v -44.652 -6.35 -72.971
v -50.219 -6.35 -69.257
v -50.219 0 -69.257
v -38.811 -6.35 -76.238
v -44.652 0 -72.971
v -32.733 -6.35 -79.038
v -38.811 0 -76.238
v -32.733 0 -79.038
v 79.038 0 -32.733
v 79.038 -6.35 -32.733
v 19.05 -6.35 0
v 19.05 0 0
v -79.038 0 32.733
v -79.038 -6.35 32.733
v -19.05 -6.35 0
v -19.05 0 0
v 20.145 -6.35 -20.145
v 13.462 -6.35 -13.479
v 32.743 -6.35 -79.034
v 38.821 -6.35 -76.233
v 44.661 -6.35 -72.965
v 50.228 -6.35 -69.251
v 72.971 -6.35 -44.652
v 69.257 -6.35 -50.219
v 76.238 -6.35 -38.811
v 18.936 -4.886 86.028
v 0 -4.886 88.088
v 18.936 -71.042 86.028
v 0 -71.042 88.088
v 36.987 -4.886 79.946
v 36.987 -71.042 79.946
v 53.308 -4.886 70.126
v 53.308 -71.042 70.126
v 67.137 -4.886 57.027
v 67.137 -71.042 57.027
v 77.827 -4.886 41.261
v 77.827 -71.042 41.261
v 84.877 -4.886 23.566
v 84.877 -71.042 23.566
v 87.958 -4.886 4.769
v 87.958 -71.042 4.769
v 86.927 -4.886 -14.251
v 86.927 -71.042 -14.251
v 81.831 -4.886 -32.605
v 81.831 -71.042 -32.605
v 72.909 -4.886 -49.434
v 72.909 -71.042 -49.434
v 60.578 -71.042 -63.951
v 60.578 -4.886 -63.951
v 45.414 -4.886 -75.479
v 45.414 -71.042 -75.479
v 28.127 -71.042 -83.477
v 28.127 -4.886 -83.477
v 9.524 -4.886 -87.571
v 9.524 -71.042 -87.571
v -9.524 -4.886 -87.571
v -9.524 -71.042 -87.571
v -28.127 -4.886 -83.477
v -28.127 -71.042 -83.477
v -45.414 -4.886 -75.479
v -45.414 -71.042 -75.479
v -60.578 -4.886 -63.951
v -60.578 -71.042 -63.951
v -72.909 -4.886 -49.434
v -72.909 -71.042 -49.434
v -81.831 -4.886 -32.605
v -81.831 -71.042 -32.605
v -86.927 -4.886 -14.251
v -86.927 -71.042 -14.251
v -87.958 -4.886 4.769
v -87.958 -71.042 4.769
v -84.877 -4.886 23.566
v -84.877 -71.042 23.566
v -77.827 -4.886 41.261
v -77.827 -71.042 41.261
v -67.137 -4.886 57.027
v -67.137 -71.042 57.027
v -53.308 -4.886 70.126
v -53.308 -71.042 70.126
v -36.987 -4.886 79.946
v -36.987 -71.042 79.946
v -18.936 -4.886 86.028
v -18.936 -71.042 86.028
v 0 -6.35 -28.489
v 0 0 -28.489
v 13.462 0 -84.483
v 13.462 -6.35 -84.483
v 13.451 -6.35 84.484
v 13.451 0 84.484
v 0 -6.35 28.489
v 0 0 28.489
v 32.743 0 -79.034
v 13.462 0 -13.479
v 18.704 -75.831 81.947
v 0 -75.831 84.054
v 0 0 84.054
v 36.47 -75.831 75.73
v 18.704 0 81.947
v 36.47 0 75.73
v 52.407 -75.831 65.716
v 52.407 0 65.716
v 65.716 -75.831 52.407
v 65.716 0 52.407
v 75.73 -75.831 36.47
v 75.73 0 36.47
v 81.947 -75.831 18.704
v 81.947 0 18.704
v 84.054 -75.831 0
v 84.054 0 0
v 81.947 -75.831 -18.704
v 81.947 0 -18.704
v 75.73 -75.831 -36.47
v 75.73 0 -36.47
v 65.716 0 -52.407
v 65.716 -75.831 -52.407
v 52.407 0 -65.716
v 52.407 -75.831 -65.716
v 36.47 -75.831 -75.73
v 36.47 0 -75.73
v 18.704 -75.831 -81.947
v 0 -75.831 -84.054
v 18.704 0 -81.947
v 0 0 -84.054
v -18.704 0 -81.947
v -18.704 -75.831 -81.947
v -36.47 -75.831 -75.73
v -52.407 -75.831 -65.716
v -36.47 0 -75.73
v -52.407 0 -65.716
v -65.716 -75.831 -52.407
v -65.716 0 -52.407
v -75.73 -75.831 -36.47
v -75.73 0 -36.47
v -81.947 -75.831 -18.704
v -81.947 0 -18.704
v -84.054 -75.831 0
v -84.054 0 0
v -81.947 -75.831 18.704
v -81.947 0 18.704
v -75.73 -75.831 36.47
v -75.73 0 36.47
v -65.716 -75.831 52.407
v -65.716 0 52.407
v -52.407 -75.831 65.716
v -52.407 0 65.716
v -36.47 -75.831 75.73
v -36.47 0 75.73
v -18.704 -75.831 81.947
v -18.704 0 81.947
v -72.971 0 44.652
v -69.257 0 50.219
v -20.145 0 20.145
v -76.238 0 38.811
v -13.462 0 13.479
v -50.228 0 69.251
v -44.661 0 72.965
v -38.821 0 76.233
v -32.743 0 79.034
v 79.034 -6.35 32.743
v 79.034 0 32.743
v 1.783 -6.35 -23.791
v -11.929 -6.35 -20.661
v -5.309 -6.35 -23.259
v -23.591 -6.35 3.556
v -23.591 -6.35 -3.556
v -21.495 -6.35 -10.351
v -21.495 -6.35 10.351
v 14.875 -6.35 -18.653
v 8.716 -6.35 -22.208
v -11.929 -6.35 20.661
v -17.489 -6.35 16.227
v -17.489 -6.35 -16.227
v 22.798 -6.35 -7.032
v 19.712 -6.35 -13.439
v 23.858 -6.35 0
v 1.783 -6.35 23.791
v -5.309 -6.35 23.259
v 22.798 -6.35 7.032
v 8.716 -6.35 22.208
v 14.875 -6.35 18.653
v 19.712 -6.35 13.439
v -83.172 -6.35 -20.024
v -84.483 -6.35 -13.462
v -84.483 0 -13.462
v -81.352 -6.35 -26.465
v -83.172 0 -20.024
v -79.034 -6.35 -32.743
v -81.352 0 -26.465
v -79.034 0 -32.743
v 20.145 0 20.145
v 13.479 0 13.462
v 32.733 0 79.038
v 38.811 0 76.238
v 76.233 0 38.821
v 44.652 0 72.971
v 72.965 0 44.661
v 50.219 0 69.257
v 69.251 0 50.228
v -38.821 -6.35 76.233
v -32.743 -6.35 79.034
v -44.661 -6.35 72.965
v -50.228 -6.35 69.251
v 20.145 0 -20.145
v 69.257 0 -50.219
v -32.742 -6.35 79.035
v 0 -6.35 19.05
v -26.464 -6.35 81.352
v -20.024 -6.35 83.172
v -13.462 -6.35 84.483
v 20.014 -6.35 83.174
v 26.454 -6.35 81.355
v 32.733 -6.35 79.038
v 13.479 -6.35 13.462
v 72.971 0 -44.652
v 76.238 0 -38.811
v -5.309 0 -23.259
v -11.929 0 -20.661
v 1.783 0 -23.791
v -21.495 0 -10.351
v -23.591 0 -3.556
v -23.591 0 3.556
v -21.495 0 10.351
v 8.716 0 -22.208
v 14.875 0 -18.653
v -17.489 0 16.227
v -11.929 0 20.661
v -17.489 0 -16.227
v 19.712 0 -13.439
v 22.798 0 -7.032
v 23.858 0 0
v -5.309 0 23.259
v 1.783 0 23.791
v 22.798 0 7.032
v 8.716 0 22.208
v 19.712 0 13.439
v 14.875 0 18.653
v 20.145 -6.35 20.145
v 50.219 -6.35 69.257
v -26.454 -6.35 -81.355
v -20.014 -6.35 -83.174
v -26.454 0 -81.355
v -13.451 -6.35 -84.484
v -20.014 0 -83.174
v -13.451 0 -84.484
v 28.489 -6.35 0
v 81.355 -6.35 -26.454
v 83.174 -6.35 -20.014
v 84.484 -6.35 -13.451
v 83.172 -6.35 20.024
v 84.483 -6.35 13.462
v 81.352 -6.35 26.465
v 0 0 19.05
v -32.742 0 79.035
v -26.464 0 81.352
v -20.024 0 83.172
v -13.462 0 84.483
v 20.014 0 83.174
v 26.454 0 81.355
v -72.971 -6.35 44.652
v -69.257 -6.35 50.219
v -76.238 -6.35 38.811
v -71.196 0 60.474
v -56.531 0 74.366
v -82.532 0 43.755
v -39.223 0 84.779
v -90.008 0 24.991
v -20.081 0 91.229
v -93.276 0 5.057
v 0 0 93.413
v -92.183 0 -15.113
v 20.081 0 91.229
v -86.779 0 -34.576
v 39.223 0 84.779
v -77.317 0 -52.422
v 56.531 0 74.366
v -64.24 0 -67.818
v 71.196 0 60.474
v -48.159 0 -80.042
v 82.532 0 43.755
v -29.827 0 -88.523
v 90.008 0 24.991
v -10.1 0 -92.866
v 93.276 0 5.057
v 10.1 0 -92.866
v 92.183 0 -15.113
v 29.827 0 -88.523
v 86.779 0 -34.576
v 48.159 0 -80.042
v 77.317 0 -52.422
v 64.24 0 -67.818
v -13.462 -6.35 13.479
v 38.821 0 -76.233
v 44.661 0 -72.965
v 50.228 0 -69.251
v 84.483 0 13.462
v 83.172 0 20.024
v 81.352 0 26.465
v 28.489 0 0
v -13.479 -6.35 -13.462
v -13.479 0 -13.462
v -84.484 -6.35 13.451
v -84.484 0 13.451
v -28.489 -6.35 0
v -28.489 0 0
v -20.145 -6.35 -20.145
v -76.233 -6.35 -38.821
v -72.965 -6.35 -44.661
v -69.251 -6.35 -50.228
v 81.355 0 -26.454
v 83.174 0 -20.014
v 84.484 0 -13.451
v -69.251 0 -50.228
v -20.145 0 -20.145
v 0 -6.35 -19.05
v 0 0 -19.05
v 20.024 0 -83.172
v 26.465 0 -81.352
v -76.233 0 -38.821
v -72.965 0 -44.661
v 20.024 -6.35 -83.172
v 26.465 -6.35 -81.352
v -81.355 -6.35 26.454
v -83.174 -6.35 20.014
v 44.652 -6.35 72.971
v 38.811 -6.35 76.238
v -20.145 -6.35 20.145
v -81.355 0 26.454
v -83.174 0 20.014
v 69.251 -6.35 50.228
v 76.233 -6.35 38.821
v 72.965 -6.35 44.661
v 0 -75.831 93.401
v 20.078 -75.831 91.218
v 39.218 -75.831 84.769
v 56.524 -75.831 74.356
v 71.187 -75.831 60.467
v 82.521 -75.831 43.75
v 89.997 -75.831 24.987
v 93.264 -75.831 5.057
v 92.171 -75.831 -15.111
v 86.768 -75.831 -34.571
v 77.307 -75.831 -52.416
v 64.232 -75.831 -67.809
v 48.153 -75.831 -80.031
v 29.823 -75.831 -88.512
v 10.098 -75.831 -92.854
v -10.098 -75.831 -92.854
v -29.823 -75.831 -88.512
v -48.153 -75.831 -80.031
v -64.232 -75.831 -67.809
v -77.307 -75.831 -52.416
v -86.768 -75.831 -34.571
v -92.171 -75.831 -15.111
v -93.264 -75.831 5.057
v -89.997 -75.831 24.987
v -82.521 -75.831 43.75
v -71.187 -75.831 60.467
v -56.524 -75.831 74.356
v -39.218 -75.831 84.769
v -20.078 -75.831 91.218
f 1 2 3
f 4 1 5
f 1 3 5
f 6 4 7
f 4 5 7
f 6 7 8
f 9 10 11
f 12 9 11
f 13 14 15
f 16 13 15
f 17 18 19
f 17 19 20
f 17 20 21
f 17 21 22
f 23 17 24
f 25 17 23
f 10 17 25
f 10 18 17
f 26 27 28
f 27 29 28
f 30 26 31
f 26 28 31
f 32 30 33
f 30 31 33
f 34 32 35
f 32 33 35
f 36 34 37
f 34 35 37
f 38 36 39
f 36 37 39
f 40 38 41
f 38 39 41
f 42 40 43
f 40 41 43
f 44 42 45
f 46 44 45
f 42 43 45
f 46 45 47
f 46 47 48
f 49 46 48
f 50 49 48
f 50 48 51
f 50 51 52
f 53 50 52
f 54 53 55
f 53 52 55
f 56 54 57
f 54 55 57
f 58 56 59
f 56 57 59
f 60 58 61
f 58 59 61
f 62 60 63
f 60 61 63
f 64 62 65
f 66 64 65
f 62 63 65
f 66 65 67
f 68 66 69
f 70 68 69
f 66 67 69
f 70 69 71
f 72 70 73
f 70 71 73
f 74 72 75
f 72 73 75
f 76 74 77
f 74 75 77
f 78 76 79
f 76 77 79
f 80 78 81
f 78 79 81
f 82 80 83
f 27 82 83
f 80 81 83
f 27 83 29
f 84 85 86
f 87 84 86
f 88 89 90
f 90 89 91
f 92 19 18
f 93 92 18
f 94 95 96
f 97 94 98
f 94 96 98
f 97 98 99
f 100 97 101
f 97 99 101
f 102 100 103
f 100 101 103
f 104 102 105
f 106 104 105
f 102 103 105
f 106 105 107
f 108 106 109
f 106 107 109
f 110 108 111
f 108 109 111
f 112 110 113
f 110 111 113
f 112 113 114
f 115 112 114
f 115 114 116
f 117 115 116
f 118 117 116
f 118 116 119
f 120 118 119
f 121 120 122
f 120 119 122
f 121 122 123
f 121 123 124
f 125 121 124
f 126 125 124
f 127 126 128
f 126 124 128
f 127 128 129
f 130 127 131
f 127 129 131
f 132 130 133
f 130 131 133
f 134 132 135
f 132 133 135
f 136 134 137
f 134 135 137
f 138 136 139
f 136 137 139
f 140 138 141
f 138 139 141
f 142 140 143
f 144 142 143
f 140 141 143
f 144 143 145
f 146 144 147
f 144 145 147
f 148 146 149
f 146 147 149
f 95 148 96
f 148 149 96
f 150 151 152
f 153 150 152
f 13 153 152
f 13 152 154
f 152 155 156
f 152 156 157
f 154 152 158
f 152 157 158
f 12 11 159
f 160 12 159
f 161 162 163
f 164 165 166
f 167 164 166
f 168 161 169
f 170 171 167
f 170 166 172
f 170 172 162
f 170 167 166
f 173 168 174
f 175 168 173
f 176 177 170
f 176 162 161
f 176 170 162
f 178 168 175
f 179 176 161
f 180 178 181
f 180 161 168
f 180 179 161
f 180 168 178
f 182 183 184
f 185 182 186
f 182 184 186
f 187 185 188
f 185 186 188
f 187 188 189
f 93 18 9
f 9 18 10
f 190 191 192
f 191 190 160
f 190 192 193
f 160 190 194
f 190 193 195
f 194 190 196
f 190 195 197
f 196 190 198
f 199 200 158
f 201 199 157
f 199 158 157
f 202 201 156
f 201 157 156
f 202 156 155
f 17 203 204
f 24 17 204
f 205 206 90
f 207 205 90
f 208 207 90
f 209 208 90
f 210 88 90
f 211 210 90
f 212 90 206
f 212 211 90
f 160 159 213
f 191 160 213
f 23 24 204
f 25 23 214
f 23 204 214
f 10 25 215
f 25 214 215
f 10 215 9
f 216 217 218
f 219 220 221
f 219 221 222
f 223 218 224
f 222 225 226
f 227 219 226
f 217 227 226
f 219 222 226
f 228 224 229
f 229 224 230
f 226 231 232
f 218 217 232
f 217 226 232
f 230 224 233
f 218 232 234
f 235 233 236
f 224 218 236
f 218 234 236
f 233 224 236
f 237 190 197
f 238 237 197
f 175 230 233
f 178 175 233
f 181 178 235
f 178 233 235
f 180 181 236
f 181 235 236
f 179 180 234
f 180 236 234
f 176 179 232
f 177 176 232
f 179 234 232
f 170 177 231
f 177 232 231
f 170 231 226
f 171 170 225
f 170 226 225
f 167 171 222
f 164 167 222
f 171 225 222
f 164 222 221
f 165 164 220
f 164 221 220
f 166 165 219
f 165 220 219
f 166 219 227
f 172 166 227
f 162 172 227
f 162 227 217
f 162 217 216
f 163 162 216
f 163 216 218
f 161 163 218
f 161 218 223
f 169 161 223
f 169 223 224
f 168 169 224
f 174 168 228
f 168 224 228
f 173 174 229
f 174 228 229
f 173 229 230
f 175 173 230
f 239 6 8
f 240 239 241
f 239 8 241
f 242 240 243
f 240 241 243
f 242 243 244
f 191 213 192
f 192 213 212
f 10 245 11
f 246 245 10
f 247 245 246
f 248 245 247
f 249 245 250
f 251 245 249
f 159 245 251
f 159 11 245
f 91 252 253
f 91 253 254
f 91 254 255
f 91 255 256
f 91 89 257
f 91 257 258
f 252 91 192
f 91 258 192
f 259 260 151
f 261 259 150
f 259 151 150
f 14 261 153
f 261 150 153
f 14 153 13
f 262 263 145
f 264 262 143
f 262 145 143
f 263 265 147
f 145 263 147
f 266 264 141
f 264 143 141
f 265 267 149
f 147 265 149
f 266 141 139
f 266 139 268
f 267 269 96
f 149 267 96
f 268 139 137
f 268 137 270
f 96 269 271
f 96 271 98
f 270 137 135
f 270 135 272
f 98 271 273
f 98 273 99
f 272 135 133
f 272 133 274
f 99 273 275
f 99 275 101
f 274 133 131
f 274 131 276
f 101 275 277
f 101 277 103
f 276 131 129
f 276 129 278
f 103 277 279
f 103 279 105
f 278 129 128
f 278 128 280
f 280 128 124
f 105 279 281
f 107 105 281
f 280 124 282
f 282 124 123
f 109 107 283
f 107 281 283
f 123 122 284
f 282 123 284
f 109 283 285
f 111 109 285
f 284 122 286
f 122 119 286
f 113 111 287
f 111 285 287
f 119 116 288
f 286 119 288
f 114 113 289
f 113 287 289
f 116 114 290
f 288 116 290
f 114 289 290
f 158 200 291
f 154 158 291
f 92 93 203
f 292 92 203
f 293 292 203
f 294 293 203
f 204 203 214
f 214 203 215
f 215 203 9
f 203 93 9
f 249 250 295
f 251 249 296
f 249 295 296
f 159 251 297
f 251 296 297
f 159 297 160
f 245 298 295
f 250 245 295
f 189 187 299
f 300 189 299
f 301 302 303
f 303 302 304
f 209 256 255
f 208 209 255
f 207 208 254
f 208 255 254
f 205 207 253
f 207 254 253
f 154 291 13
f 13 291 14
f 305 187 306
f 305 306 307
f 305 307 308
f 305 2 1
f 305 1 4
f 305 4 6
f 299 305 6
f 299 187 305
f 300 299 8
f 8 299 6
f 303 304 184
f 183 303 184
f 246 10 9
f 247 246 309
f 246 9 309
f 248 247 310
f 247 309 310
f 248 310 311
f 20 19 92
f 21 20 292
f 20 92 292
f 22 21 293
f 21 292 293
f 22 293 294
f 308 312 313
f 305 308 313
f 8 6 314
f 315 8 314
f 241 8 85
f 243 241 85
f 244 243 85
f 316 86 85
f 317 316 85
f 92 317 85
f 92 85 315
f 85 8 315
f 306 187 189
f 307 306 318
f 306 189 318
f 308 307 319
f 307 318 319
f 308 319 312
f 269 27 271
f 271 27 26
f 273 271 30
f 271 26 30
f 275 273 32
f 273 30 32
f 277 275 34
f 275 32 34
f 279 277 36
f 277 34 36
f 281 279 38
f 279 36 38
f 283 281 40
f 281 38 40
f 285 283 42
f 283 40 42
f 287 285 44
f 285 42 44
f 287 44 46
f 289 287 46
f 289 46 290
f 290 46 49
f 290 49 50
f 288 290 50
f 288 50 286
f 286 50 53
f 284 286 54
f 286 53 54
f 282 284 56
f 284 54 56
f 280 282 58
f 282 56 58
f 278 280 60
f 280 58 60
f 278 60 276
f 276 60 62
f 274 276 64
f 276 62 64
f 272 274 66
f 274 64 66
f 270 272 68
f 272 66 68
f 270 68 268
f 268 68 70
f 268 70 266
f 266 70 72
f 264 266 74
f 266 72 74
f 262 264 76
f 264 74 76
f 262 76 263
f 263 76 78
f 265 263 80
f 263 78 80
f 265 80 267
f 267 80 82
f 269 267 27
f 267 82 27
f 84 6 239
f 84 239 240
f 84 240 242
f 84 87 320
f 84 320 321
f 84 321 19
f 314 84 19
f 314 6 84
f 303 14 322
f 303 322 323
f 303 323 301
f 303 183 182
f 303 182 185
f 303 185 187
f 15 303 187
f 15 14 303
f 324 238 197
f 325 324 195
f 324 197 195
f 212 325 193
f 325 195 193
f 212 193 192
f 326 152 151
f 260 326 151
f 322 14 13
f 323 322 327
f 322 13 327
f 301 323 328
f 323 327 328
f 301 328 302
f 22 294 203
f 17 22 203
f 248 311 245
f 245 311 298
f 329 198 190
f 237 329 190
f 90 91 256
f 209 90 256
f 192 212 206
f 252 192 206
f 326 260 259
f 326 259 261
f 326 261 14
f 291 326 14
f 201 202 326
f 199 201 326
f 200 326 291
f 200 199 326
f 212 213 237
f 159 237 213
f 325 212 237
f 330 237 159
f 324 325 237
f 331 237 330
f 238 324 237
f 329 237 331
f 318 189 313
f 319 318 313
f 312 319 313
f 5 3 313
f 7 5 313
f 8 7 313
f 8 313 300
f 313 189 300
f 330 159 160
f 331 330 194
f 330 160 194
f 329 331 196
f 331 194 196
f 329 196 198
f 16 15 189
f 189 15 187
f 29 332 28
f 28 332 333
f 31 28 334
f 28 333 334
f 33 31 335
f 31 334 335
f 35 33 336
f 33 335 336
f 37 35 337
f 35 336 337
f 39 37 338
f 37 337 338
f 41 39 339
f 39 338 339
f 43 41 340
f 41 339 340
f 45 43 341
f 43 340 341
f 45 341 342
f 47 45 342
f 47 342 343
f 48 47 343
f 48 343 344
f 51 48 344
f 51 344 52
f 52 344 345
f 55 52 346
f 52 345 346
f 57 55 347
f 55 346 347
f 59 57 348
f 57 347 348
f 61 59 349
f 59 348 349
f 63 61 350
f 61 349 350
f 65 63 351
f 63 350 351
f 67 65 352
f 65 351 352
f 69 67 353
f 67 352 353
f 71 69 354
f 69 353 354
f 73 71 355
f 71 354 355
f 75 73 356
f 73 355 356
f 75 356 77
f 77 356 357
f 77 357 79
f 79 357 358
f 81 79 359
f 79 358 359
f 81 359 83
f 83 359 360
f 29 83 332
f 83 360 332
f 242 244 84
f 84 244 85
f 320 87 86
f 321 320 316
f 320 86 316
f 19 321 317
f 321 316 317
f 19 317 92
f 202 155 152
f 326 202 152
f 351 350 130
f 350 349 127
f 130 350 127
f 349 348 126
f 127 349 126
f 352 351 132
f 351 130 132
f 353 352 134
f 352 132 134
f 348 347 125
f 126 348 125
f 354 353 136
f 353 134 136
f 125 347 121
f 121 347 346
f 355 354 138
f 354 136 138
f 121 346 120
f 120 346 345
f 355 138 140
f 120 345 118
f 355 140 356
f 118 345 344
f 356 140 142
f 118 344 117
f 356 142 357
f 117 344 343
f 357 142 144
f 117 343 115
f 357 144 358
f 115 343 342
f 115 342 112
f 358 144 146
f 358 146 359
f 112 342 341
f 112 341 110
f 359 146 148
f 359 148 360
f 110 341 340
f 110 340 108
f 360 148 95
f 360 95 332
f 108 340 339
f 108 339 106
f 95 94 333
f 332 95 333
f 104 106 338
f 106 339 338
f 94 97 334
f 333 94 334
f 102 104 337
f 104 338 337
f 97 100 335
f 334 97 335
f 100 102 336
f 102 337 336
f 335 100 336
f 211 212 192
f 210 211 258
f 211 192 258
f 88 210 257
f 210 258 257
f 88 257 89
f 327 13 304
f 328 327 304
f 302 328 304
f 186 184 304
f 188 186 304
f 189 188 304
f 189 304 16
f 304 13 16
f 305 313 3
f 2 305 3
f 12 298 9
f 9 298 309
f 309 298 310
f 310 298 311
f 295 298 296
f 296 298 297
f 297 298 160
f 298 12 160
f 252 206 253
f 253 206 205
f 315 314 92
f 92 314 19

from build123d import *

# Parameters (mm, degrees)
F0_R     = 19.05
F1_DEPTH = 6.35
F3_DEPTH = 25.4
F4_R     = 23.857637564
F5_DEPTH = 6.35


with BuildPart() as f1:
    # F0 (on Front) → F1 (new body)
    with BuildSketch(Plane.XZ):
        with BuildLine():
            Line((13.4509662166, 84.484256804), (0, 28.4890606999))
            Line((0, 28.4890606999), (-13.4615930724, 84.4825641883))
            ThreePointArc((-13.4615930724, 84.4825641883), (-32.7429024117, 79.0342993993), (-50.2281214643, 69.2506603149))
            Line((-50.2281214643, 69.2506603149), (-20.1448080106, 20.1448080106))
            Line((-20.1448080106, 20.1448080106), (-69.2569777767, 50.2194102825))
            ThreePointArc((-69.2569777767, 50.2194102825), (-79.0384173826, 32.7329607205), (-84.484256804, 13.4509662166))
            Line((-84.484256804, 13.4509662166), (-28.4890606999, 0))
            Line((-28.4890606999, 0), (-84.4825641883, -13.4615930724))
            ThreePointArc((-84.4825641883, -13.4615930724), (-79.0342993993, -32.7429024117), (-69.2506603149, -50.2281214643))
            Line((-69.2506603149, -50.2281214643), (-20.1448080106, -20.1448080106))
            Line((-20.1448080106, -20.1448080106), (-50.2194102825, -69.2569777767))
            ThreePointArc((-50.2194102825, -69.2569777767), (-32.7329607205, -79.0384173826), (-13.4509662166, -84.484256804))
            Line((-13.4509662166, -84.484256804), (0, -28.4890606999))
            Line((0, -28.4890606999), (13.4615930724, -84.4825641883))
            ThreePointArc((13.4615930724, -84.4825641883), (32.7429024117, -79.0342993993), (50.2281214643, -69.2506603149))
            Line((50.2281214643, -69.2506603149), (20.1448080106, -20.1448080106))
            Line((20.1448080106, -20.1448080106), (69.2569777767, -50.2194102825))
            ThreePointArc((69.2569777767, -50.2194102825), (79.0384173826, -32.7329607205), (84.484256804, -13.4509662166))
            Line((84.484256804, -13.4509662166), (28.4890606999, 0))
            Line((28.4890606999, 0), (84.4825641883, 13.4615930724))
            ThreePointArc((84.4825641883, 13.4615930724), (79.0342993993, 32.7429024117), (69.2506603149, 50.2281214643))
            Line((69.2506603149, 50.2281214643), (20.1448080106, 20.1448080106))
            Line((20.1448080106, 20.1448080106), (50.2194102825, 69.2569777767))
            ThreePointArc((50.2194102825, 69.2569777767), (32.7329607205, 79.0384173826), (13.4509662166, 84.484256804))
        make_face()
        Circle(F0_R, mode=Mode.SUBTRACT)
    extrude(amount=F1_DEPTH)

    # F2 (on face) → F3 (cut)
    with BuildSketch(Plane.XZ.offset(6.35)):
        with BuildLine():
            Line((79.0342993993, 32.7429024117), (13.4791695573, 13.4615930724))
            ThreePointArc((13.4791695573, 13.4615930724), (17.6022822393, 7.2843778023), (19.05, 0))
            Line((19.05, 0), (79.0342993993, 32.7429024117))
        make_face()
        with BuildLine():
            Line((32.7329607205, 79.0384173826), (0, 19.05))
            ThreePointArc((0, 19.05), (7.295860195, 17.5975260765), (13.4791695573, 13.4615930724))
            Line((13.4791695573, 13.4615930724), (32.7329607205, 79.0384173826))
        make_face()
        with BuildLine():
            ThreePointArc((-13.4615930724, 13.4791695573), (-7.2843778023, 17.6022822393), (0, 19.05))
            Line((0, 19.05), (-32.7420570158, 79.0346496308))
            ThreePointArc((-32.7420570158, 79.0346496308), (-32.7424797142, 79.0344745162), (-32.7429024117, 79.0342993993))
            Line((-32.7429024117, 79.0342993993), (-13.4615930724, 13.4791695573))
        make_face()
        with BuildLine():
            ThreePointArc((-19.05, 0), (-17.5975260765, 7.295860195), (-13.4615930724, 13.4791695573))
            Line((-13.4615930724, 13.4791695573), (-79.0384173826, 32.7329607205))
            Line((-79.0384173826, 32.7329607205), (-19.05, 0))
        make_face()
        with BuildLine():
            ThreePointArc((-13.4791695573, -13.4615930724), (-17.6022822393, -7.2843778023), (-19.05, 0))
            Line((-19.05, 0), (-79.0342993993, -32.7429024117))
            Line((-79.0342993993, -32.7429024117), (-13.4791695573, -13.4615930724))
        make_face()
        with BuildLine():
            ThreePointArc((0, -19.05), (-7.295860195, -17.5975260765), (-13.4791695573, -13.4615930724))
            Line((-13.4791695573, -13.4615930724), (-32.7329607205, -79.0384173826))
            Line((-32.7329607205, -79.0384173826), (0, -19.05))
        make_face()
        with BuildLine():
            Line((32.7429024117, -79.0342993993), (13.4615930724, -13.4791695573))
            ThreePointArc((13.4615930724, -13.4791695573), (7.2843778023, -17.6022822393), (0, -19.05))
            Line((0, -19.05), (32.7429024117, -79.0342993993))
        make_face()
        with BuildLine():
            Line((79.0384173826, -32.7329607205), (19.05, 0))
            ThreePointArc((19.05, 0), (17.5975260765, -7.295860195), (13.4615930724, -13.4791695573))
            Line((13.4615930724, -13.4791695573), (79.0384173826, -32.7329607205))
        make_face()
    extrude(amount=-F3_DEPTH, mode=Mode.SUBTRACT)


with BuildPart() as f5:
    # F4 (on Front) → F5 (new body)
    with BuildSketch(Plane.XZ):
        Circle(F4_R)
    extrude(amount=F5_DEPTH)


with BuildPart() as f8:
    # F6 (on Right) → F8 (revolve)
    with BuildSketch(Plane.YZ):
        Polygon((0, 84.0539722534), (0, 93.4131159278), (-4.8862942494, 88.0876552102), (-71.0415691137, 88.0876552102), (-75.8310928941, 93.4011722534), (-75.8310928941, 84.0539722534), align=None)
    revolve(axis=Axis((0, 40.0305017829, 0), (0, 1, 0)))


solid = Compound([f1.part, f5.part, f8.part])
